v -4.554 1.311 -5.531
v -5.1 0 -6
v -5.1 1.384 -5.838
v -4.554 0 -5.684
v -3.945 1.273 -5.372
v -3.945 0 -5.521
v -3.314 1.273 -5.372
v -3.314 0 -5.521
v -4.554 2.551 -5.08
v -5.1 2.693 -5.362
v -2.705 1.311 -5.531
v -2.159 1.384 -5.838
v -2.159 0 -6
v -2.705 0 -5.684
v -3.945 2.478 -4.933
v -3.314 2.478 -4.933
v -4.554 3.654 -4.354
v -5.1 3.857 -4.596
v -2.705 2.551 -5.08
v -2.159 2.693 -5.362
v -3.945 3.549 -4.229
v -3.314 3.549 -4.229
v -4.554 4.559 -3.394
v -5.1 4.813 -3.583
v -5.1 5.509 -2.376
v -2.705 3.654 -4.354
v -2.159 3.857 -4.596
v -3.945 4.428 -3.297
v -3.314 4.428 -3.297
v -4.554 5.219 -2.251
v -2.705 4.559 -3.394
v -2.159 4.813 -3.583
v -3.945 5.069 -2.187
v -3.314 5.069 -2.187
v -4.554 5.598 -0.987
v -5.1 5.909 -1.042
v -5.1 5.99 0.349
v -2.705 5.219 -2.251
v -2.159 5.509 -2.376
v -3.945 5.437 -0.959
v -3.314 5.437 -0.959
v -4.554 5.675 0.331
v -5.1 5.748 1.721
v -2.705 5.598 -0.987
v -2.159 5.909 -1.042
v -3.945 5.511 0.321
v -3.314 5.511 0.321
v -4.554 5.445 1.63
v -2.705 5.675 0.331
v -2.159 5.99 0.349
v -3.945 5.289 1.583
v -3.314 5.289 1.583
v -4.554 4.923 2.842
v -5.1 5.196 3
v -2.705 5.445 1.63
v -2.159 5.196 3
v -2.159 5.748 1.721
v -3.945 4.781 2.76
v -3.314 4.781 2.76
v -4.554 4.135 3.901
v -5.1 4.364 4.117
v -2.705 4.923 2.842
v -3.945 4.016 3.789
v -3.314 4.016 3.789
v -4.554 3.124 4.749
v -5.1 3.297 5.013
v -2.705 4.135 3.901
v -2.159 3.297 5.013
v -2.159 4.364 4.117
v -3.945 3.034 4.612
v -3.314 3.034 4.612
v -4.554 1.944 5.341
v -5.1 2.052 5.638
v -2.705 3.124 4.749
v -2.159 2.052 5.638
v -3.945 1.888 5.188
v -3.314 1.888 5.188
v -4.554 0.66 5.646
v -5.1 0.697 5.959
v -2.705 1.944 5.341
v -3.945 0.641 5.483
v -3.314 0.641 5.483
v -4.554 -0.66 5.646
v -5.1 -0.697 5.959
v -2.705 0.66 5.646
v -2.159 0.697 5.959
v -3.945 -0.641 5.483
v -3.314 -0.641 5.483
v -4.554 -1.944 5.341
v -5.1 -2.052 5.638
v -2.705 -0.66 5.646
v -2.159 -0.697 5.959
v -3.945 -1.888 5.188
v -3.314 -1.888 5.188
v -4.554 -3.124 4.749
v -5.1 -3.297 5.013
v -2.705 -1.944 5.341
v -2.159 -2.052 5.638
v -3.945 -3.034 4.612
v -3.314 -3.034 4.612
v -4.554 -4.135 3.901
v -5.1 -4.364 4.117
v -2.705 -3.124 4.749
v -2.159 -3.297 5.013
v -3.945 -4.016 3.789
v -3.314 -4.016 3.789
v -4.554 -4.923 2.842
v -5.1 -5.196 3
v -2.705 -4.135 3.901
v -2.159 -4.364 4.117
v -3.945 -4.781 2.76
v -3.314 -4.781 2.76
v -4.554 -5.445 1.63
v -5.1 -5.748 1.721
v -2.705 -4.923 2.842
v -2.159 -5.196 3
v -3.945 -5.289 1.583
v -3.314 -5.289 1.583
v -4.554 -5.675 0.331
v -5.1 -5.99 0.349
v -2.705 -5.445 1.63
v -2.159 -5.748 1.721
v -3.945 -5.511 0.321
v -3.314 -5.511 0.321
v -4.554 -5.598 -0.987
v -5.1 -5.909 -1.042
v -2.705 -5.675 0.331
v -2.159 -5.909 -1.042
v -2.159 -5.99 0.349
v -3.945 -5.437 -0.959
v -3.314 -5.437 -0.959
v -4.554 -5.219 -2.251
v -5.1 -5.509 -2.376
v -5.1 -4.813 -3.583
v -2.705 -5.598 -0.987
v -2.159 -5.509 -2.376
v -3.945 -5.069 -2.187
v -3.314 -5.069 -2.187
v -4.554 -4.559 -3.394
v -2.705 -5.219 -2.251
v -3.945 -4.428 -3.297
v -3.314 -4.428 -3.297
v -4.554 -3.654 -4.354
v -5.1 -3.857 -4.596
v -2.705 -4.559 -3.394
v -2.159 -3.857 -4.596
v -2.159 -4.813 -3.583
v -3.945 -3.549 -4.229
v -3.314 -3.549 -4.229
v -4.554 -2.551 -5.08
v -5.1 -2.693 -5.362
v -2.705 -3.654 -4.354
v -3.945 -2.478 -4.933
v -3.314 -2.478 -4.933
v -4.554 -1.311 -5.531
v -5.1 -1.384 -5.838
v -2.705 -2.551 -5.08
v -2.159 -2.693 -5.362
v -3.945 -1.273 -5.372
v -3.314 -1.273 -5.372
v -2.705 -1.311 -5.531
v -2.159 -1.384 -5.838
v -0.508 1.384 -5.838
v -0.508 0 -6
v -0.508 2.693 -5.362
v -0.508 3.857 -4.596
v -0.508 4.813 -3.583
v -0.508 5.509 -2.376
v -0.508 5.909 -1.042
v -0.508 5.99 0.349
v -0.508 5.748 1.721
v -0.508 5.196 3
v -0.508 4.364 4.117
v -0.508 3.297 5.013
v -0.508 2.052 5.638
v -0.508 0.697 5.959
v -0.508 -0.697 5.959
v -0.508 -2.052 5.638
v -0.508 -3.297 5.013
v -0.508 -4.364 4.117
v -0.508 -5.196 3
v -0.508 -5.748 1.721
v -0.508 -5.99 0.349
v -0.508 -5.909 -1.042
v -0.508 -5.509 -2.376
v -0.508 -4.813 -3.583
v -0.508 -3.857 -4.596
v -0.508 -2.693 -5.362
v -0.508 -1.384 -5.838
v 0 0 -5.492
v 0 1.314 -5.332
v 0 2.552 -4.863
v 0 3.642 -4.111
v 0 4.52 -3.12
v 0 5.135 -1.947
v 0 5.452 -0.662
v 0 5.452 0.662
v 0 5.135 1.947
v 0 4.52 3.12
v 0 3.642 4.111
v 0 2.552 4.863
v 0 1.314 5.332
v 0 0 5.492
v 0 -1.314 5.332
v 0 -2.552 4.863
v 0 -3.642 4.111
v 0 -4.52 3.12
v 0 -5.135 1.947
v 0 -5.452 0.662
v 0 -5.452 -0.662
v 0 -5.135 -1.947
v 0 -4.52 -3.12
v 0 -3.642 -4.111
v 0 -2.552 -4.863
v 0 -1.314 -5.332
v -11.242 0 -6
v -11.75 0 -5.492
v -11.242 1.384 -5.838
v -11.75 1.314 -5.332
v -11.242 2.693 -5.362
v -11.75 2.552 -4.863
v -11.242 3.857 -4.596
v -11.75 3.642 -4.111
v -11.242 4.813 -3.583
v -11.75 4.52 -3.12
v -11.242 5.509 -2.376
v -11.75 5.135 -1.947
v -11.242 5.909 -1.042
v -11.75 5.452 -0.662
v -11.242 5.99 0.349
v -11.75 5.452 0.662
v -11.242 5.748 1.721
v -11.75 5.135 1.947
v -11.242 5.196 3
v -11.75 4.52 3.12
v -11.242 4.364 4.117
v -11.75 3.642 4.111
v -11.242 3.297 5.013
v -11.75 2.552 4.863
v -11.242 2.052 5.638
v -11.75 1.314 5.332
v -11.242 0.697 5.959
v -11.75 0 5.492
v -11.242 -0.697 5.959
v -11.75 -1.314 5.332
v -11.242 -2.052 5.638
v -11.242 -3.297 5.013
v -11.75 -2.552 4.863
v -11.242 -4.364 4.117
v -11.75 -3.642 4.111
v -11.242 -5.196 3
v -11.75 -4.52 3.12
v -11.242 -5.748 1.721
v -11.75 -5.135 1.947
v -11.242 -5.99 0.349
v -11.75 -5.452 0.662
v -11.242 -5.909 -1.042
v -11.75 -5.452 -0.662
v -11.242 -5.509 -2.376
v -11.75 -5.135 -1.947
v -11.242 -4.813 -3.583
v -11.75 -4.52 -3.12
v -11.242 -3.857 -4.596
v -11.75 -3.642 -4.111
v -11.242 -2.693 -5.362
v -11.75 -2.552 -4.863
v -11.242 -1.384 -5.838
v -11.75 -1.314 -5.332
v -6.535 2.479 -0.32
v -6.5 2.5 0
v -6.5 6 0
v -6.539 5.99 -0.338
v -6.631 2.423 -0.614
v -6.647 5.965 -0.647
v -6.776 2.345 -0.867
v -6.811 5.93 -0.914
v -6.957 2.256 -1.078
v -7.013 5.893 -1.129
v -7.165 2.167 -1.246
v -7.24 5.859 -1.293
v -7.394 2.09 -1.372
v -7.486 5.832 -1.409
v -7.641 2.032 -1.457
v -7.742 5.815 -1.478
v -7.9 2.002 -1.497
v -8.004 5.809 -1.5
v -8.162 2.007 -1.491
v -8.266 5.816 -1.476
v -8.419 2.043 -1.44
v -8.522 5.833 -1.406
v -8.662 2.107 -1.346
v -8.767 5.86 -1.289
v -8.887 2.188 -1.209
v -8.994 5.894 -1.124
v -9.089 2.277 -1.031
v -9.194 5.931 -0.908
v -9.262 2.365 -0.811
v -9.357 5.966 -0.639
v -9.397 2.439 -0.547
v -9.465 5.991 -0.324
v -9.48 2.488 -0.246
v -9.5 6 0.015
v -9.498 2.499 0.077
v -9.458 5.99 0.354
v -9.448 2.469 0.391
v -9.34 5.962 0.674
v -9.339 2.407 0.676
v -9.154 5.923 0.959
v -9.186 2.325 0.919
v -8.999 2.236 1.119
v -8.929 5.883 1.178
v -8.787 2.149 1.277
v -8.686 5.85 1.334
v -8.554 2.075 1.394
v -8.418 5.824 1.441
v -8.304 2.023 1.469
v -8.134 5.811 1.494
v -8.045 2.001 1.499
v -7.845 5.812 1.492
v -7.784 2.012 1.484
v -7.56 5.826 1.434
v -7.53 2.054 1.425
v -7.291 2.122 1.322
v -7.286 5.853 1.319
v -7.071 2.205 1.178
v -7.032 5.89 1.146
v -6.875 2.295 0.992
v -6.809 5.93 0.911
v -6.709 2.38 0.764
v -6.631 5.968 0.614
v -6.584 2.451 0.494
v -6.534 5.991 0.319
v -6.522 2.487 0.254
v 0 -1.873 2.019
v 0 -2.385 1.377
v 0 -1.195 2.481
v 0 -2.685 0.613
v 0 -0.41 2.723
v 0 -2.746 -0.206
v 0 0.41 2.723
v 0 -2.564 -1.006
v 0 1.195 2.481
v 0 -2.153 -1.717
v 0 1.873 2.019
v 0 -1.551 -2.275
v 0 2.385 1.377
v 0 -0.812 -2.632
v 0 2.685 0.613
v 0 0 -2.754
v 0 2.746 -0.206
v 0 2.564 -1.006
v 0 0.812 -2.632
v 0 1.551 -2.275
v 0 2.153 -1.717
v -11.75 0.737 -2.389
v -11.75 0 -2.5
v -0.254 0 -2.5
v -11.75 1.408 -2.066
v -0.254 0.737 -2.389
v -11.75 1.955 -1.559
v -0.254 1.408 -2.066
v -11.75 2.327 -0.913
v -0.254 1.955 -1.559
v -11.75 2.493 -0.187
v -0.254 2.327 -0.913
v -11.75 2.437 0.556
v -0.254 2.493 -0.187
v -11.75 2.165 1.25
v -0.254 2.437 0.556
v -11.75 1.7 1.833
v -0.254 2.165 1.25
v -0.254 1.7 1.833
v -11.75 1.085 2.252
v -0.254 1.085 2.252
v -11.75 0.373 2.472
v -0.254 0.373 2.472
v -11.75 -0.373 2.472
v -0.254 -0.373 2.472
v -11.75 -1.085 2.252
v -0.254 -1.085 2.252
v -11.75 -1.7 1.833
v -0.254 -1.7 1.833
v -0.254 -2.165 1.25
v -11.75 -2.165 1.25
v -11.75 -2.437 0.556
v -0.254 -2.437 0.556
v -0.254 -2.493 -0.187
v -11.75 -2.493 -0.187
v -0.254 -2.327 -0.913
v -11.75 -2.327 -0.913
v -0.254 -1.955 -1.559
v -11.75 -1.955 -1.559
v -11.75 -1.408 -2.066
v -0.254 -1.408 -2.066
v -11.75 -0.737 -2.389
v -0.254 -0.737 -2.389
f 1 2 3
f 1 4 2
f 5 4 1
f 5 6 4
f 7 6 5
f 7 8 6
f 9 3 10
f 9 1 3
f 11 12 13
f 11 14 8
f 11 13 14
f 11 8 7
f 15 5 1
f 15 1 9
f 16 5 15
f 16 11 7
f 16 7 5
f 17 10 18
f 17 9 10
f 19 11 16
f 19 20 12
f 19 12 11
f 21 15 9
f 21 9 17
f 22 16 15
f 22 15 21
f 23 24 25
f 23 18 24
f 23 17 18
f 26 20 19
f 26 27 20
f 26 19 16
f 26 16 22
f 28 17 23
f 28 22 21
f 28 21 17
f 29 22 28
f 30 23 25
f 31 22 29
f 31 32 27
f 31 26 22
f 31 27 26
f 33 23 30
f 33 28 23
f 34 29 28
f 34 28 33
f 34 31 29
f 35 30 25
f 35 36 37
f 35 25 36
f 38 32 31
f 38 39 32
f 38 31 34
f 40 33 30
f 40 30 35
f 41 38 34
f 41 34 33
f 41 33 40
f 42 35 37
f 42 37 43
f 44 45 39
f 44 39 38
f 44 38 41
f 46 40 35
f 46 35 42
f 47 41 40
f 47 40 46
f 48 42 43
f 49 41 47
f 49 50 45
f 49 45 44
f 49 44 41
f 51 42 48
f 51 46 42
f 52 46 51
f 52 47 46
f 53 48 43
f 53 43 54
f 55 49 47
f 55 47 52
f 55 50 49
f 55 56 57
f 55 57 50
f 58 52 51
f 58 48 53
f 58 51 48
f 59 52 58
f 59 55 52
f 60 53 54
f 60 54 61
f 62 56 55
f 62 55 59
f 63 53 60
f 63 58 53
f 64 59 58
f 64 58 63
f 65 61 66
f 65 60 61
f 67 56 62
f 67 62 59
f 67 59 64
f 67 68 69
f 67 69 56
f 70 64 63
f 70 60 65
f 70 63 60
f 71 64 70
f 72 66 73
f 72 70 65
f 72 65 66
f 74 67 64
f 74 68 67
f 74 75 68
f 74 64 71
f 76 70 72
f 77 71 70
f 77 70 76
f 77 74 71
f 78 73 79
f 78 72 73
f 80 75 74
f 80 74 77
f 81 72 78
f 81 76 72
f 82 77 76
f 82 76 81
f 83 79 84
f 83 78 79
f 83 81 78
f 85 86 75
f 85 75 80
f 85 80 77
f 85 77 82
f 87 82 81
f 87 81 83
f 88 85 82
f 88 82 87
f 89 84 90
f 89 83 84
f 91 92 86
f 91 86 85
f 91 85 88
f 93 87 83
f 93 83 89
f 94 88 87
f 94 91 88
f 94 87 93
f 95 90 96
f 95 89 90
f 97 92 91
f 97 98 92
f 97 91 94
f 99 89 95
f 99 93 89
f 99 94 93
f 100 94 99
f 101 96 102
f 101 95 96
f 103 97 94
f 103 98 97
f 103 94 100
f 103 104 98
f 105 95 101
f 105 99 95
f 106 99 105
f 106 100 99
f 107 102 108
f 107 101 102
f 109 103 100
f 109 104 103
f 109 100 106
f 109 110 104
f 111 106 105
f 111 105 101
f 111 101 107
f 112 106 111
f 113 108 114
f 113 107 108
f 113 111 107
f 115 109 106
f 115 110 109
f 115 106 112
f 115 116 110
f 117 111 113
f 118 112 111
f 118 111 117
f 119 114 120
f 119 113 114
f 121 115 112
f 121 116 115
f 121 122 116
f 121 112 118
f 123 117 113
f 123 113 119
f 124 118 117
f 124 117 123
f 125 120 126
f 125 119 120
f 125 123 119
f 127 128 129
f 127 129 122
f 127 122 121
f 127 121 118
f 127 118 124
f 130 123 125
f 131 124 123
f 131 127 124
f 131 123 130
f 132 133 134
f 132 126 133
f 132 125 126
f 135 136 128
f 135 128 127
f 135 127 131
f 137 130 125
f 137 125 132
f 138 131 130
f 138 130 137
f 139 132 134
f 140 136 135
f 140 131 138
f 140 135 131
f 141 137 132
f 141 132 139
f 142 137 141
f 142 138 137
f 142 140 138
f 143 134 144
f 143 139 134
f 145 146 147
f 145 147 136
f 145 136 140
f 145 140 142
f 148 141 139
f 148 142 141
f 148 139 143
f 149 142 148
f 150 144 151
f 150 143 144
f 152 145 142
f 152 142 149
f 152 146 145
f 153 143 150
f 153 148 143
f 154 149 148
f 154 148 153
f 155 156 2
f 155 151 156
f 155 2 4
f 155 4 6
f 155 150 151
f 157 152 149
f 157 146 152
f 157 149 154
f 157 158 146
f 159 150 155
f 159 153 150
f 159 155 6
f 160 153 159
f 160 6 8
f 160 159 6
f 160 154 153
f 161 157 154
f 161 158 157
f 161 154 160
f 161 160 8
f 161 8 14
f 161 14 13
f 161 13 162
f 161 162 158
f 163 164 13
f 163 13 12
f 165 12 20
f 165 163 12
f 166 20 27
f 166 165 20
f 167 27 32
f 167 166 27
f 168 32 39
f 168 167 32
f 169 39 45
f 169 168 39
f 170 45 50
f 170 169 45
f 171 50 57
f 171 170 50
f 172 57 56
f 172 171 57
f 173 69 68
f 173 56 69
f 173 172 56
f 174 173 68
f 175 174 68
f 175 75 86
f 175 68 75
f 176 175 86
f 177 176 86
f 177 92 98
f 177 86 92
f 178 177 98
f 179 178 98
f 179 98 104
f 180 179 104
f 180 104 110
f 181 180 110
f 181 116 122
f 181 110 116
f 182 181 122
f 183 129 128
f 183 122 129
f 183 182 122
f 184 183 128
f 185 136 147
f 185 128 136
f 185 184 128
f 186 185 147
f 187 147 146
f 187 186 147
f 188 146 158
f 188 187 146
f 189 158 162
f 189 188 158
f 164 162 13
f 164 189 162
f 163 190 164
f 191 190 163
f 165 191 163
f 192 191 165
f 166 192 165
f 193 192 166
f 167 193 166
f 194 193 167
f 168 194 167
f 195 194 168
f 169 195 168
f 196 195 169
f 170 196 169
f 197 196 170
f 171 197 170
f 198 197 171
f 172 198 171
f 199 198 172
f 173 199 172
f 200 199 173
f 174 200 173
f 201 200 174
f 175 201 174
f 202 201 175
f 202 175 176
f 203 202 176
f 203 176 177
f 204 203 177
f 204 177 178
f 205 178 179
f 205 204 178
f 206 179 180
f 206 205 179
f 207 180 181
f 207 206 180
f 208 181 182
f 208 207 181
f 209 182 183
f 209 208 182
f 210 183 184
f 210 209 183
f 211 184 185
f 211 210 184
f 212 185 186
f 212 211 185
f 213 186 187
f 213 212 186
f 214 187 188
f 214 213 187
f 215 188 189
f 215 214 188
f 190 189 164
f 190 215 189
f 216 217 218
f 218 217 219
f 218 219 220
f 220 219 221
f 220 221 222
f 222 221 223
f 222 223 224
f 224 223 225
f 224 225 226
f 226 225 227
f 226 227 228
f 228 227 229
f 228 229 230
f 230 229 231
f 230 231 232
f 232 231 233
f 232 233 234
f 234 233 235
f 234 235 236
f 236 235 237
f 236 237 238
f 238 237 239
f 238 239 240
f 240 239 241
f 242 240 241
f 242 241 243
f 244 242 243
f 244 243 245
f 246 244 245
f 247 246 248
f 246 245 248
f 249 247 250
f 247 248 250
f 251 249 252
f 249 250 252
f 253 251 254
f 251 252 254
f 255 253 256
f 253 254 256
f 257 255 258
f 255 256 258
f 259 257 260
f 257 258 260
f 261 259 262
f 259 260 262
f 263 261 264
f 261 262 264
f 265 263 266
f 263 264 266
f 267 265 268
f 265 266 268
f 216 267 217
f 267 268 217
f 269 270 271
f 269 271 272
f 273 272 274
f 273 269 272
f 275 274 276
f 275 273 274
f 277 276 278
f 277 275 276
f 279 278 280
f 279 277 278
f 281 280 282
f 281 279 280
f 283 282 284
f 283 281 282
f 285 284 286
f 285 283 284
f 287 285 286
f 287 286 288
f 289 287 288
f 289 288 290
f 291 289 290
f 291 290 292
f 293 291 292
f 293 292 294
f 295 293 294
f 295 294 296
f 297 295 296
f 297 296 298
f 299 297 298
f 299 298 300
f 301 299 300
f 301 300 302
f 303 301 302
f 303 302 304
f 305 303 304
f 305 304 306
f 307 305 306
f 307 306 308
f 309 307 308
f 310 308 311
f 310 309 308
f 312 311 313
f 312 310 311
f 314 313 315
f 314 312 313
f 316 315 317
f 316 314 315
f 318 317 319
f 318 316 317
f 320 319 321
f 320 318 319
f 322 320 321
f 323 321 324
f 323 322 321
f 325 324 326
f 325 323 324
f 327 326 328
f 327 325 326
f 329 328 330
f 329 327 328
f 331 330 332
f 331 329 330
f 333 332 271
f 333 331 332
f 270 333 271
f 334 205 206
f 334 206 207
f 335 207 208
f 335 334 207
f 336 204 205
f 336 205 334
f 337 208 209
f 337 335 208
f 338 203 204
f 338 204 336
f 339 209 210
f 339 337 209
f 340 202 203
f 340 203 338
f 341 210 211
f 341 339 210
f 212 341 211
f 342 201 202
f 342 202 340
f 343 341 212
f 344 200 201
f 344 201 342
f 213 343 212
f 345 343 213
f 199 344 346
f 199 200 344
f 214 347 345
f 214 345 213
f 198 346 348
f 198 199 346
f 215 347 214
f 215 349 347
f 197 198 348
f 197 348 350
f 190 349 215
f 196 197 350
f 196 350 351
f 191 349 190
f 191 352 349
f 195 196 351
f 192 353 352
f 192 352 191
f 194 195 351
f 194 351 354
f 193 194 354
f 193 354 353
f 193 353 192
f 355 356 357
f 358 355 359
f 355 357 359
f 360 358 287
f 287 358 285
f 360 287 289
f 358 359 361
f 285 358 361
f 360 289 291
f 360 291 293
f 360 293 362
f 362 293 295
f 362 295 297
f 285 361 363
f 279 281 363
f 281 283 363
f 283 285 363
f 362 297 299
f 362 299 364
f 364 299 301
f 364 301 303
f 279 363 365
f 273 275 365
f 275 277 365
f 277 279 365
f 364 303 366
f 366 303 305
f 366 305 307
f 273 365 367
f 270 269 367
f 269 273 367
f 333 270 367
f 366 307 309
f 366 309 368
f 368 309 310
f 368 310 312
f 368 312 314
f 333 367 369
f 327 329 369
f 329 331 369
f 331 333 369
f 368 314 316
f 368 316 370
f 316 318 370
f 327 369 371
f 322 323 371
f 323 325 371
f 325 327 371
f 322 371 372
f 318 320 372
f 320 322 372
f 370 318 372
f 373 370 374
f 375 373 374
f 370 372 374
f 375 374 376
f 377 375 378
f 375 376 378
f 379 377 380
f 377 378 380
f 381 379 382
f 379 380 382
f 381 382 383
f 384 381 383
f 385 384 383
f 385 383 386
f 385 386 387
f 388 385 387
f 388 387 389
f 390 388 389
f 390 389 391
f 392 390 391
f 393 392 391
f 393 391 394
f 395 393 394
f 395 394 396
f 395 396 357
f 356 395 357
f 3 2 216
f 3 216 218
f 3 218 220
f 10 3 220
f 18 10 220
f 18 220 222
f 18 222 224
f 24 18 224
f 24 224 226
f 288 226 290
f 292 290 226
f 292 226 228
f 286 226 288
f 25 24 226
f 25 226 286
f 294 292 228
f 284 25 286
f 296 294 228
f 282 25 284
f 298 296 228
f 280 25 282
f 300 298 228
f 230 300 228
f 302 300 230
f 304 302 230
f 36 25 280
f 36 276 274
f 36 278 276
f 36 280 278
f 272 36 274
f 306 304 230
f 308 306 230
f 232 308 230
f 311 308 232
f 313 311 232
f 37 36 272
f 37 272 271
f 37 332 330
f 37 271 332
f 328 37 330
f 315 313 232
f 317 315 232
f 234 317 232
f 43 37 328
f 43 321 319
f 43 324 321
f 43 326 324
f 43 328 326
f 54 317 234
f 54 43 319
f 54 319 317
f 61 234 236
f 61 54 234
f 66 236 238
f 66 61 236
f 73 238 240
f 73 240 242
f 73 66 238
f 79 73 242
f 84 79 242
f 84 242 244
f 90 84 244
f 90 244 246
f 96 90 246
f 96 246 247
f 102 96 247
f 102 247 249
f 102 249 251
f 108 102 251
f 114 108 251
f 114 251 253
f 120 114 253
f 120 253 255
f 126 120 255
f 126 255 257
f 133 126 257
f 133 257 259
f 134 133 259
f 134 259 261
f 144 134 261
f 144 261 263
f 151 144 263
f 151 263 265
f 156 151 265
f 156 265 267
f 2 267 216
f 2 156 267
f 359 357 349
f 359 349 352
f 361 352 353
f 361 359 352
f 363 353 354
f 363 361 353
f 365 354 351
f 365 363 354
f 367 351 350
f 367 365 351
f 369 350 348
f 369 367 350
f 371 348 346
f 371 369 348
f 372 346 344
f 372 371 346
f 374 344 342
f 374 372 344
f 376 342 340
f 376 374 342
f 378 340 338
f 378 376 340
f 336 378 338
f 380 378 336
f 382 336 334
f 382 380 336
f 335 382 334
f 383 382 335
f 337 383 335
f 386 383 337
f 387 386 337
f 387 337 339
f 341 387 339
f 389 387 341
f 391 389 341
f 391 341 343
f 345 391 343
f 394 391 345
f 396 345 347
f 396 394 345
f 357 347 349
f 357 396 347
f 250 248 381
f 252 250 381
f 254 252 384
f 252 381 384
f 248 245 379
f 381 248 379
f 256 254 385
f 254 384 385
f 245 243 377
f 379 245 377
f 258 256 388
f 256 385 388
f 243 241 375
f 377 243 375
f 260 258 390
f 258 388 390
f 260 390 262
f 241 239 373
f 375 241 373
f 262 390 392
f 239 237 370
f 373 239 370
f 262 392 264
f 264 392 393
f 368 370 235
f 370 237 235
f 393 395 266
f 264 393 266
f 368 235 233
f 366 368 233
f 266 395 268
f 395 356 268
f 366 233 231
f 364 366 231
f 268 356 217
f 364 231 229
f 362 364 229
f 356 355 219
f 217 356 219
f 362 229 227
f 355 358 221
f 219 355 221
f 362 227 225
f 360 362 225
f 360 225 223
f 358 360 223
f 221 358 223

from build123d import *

# Parameters (mm, degrees)
SKETCH1_R           = 6
SKETCH1_R_2         = 2.5
BOSS_EXTRUDE1_DEPTH = 11.75
SKETCH2_R           = 2.413
SKETCH3_R           = 1.5
CUT_EXTRUDE1_DEPTH  = 12
CHAMFER1_SIZE       = 0.508
CHAMFER2_SIZE       = 0.254


with BuildPart() as part:
    # Sketch1 → Boss-Extrude1 (new body)
    with BuildSketch(Plane(origin=(0, 0, 0), x_dir=(0, 0, -1), z_dir=(1, 0, 0))):
        Circle(SKETCH1_R)
        Circle(SKETCH1_R_2, mode=Mode.SUBTRACT)
    extrude(amount=-BOSS_EXTRUDE1_DEPTH)

    # Sketch2 → Cut-Revolve1 (revolve, cut)
    with BuildSketch(Plane(origin=(0, 0, 0), x_dir=(1, 0, 0), z_dir=(0, 1, 0))):
        with Locations((-3.629714112, 7.913)):
            Circle(SKETCH2_R)
    revolve(axis=Axis((0, 0, 0), (1, 0, 0)), mode=Mode.SUBTRACT)

    # Sketch3 → Cut-Extrude1 (cut)
    with BuildSketch(Plane(origin=(0, 0, 0), x_dir=(1, 0, 0), z_dir=(0, 1, 0))):
        with Locations((-8, 0)):
            Circle(SKETCH3_R)
    extrude(amount=CUT_EXTRUDE1_DEPTH, mode=Mode.SUBTRACT)

    # Chamfer1
    chamfer1_edges = [part.edges().sort_by_distance(p)[0] for p in [
        (0, 0, 6),
        (-11.75, 0, 6),
    ]]
    chamfer(chamfer1_edges, length=CHAMFER1_SIZE)

    # Chamfer2
    chamfer2_edges = [part.edges().sort_by_distance(p)[0] for p in [
        (0, 0, 2.5),
    ]]
    chamfer(chamfer2_edges, length=CHAMFER2_SIZE)


solid = part.part
